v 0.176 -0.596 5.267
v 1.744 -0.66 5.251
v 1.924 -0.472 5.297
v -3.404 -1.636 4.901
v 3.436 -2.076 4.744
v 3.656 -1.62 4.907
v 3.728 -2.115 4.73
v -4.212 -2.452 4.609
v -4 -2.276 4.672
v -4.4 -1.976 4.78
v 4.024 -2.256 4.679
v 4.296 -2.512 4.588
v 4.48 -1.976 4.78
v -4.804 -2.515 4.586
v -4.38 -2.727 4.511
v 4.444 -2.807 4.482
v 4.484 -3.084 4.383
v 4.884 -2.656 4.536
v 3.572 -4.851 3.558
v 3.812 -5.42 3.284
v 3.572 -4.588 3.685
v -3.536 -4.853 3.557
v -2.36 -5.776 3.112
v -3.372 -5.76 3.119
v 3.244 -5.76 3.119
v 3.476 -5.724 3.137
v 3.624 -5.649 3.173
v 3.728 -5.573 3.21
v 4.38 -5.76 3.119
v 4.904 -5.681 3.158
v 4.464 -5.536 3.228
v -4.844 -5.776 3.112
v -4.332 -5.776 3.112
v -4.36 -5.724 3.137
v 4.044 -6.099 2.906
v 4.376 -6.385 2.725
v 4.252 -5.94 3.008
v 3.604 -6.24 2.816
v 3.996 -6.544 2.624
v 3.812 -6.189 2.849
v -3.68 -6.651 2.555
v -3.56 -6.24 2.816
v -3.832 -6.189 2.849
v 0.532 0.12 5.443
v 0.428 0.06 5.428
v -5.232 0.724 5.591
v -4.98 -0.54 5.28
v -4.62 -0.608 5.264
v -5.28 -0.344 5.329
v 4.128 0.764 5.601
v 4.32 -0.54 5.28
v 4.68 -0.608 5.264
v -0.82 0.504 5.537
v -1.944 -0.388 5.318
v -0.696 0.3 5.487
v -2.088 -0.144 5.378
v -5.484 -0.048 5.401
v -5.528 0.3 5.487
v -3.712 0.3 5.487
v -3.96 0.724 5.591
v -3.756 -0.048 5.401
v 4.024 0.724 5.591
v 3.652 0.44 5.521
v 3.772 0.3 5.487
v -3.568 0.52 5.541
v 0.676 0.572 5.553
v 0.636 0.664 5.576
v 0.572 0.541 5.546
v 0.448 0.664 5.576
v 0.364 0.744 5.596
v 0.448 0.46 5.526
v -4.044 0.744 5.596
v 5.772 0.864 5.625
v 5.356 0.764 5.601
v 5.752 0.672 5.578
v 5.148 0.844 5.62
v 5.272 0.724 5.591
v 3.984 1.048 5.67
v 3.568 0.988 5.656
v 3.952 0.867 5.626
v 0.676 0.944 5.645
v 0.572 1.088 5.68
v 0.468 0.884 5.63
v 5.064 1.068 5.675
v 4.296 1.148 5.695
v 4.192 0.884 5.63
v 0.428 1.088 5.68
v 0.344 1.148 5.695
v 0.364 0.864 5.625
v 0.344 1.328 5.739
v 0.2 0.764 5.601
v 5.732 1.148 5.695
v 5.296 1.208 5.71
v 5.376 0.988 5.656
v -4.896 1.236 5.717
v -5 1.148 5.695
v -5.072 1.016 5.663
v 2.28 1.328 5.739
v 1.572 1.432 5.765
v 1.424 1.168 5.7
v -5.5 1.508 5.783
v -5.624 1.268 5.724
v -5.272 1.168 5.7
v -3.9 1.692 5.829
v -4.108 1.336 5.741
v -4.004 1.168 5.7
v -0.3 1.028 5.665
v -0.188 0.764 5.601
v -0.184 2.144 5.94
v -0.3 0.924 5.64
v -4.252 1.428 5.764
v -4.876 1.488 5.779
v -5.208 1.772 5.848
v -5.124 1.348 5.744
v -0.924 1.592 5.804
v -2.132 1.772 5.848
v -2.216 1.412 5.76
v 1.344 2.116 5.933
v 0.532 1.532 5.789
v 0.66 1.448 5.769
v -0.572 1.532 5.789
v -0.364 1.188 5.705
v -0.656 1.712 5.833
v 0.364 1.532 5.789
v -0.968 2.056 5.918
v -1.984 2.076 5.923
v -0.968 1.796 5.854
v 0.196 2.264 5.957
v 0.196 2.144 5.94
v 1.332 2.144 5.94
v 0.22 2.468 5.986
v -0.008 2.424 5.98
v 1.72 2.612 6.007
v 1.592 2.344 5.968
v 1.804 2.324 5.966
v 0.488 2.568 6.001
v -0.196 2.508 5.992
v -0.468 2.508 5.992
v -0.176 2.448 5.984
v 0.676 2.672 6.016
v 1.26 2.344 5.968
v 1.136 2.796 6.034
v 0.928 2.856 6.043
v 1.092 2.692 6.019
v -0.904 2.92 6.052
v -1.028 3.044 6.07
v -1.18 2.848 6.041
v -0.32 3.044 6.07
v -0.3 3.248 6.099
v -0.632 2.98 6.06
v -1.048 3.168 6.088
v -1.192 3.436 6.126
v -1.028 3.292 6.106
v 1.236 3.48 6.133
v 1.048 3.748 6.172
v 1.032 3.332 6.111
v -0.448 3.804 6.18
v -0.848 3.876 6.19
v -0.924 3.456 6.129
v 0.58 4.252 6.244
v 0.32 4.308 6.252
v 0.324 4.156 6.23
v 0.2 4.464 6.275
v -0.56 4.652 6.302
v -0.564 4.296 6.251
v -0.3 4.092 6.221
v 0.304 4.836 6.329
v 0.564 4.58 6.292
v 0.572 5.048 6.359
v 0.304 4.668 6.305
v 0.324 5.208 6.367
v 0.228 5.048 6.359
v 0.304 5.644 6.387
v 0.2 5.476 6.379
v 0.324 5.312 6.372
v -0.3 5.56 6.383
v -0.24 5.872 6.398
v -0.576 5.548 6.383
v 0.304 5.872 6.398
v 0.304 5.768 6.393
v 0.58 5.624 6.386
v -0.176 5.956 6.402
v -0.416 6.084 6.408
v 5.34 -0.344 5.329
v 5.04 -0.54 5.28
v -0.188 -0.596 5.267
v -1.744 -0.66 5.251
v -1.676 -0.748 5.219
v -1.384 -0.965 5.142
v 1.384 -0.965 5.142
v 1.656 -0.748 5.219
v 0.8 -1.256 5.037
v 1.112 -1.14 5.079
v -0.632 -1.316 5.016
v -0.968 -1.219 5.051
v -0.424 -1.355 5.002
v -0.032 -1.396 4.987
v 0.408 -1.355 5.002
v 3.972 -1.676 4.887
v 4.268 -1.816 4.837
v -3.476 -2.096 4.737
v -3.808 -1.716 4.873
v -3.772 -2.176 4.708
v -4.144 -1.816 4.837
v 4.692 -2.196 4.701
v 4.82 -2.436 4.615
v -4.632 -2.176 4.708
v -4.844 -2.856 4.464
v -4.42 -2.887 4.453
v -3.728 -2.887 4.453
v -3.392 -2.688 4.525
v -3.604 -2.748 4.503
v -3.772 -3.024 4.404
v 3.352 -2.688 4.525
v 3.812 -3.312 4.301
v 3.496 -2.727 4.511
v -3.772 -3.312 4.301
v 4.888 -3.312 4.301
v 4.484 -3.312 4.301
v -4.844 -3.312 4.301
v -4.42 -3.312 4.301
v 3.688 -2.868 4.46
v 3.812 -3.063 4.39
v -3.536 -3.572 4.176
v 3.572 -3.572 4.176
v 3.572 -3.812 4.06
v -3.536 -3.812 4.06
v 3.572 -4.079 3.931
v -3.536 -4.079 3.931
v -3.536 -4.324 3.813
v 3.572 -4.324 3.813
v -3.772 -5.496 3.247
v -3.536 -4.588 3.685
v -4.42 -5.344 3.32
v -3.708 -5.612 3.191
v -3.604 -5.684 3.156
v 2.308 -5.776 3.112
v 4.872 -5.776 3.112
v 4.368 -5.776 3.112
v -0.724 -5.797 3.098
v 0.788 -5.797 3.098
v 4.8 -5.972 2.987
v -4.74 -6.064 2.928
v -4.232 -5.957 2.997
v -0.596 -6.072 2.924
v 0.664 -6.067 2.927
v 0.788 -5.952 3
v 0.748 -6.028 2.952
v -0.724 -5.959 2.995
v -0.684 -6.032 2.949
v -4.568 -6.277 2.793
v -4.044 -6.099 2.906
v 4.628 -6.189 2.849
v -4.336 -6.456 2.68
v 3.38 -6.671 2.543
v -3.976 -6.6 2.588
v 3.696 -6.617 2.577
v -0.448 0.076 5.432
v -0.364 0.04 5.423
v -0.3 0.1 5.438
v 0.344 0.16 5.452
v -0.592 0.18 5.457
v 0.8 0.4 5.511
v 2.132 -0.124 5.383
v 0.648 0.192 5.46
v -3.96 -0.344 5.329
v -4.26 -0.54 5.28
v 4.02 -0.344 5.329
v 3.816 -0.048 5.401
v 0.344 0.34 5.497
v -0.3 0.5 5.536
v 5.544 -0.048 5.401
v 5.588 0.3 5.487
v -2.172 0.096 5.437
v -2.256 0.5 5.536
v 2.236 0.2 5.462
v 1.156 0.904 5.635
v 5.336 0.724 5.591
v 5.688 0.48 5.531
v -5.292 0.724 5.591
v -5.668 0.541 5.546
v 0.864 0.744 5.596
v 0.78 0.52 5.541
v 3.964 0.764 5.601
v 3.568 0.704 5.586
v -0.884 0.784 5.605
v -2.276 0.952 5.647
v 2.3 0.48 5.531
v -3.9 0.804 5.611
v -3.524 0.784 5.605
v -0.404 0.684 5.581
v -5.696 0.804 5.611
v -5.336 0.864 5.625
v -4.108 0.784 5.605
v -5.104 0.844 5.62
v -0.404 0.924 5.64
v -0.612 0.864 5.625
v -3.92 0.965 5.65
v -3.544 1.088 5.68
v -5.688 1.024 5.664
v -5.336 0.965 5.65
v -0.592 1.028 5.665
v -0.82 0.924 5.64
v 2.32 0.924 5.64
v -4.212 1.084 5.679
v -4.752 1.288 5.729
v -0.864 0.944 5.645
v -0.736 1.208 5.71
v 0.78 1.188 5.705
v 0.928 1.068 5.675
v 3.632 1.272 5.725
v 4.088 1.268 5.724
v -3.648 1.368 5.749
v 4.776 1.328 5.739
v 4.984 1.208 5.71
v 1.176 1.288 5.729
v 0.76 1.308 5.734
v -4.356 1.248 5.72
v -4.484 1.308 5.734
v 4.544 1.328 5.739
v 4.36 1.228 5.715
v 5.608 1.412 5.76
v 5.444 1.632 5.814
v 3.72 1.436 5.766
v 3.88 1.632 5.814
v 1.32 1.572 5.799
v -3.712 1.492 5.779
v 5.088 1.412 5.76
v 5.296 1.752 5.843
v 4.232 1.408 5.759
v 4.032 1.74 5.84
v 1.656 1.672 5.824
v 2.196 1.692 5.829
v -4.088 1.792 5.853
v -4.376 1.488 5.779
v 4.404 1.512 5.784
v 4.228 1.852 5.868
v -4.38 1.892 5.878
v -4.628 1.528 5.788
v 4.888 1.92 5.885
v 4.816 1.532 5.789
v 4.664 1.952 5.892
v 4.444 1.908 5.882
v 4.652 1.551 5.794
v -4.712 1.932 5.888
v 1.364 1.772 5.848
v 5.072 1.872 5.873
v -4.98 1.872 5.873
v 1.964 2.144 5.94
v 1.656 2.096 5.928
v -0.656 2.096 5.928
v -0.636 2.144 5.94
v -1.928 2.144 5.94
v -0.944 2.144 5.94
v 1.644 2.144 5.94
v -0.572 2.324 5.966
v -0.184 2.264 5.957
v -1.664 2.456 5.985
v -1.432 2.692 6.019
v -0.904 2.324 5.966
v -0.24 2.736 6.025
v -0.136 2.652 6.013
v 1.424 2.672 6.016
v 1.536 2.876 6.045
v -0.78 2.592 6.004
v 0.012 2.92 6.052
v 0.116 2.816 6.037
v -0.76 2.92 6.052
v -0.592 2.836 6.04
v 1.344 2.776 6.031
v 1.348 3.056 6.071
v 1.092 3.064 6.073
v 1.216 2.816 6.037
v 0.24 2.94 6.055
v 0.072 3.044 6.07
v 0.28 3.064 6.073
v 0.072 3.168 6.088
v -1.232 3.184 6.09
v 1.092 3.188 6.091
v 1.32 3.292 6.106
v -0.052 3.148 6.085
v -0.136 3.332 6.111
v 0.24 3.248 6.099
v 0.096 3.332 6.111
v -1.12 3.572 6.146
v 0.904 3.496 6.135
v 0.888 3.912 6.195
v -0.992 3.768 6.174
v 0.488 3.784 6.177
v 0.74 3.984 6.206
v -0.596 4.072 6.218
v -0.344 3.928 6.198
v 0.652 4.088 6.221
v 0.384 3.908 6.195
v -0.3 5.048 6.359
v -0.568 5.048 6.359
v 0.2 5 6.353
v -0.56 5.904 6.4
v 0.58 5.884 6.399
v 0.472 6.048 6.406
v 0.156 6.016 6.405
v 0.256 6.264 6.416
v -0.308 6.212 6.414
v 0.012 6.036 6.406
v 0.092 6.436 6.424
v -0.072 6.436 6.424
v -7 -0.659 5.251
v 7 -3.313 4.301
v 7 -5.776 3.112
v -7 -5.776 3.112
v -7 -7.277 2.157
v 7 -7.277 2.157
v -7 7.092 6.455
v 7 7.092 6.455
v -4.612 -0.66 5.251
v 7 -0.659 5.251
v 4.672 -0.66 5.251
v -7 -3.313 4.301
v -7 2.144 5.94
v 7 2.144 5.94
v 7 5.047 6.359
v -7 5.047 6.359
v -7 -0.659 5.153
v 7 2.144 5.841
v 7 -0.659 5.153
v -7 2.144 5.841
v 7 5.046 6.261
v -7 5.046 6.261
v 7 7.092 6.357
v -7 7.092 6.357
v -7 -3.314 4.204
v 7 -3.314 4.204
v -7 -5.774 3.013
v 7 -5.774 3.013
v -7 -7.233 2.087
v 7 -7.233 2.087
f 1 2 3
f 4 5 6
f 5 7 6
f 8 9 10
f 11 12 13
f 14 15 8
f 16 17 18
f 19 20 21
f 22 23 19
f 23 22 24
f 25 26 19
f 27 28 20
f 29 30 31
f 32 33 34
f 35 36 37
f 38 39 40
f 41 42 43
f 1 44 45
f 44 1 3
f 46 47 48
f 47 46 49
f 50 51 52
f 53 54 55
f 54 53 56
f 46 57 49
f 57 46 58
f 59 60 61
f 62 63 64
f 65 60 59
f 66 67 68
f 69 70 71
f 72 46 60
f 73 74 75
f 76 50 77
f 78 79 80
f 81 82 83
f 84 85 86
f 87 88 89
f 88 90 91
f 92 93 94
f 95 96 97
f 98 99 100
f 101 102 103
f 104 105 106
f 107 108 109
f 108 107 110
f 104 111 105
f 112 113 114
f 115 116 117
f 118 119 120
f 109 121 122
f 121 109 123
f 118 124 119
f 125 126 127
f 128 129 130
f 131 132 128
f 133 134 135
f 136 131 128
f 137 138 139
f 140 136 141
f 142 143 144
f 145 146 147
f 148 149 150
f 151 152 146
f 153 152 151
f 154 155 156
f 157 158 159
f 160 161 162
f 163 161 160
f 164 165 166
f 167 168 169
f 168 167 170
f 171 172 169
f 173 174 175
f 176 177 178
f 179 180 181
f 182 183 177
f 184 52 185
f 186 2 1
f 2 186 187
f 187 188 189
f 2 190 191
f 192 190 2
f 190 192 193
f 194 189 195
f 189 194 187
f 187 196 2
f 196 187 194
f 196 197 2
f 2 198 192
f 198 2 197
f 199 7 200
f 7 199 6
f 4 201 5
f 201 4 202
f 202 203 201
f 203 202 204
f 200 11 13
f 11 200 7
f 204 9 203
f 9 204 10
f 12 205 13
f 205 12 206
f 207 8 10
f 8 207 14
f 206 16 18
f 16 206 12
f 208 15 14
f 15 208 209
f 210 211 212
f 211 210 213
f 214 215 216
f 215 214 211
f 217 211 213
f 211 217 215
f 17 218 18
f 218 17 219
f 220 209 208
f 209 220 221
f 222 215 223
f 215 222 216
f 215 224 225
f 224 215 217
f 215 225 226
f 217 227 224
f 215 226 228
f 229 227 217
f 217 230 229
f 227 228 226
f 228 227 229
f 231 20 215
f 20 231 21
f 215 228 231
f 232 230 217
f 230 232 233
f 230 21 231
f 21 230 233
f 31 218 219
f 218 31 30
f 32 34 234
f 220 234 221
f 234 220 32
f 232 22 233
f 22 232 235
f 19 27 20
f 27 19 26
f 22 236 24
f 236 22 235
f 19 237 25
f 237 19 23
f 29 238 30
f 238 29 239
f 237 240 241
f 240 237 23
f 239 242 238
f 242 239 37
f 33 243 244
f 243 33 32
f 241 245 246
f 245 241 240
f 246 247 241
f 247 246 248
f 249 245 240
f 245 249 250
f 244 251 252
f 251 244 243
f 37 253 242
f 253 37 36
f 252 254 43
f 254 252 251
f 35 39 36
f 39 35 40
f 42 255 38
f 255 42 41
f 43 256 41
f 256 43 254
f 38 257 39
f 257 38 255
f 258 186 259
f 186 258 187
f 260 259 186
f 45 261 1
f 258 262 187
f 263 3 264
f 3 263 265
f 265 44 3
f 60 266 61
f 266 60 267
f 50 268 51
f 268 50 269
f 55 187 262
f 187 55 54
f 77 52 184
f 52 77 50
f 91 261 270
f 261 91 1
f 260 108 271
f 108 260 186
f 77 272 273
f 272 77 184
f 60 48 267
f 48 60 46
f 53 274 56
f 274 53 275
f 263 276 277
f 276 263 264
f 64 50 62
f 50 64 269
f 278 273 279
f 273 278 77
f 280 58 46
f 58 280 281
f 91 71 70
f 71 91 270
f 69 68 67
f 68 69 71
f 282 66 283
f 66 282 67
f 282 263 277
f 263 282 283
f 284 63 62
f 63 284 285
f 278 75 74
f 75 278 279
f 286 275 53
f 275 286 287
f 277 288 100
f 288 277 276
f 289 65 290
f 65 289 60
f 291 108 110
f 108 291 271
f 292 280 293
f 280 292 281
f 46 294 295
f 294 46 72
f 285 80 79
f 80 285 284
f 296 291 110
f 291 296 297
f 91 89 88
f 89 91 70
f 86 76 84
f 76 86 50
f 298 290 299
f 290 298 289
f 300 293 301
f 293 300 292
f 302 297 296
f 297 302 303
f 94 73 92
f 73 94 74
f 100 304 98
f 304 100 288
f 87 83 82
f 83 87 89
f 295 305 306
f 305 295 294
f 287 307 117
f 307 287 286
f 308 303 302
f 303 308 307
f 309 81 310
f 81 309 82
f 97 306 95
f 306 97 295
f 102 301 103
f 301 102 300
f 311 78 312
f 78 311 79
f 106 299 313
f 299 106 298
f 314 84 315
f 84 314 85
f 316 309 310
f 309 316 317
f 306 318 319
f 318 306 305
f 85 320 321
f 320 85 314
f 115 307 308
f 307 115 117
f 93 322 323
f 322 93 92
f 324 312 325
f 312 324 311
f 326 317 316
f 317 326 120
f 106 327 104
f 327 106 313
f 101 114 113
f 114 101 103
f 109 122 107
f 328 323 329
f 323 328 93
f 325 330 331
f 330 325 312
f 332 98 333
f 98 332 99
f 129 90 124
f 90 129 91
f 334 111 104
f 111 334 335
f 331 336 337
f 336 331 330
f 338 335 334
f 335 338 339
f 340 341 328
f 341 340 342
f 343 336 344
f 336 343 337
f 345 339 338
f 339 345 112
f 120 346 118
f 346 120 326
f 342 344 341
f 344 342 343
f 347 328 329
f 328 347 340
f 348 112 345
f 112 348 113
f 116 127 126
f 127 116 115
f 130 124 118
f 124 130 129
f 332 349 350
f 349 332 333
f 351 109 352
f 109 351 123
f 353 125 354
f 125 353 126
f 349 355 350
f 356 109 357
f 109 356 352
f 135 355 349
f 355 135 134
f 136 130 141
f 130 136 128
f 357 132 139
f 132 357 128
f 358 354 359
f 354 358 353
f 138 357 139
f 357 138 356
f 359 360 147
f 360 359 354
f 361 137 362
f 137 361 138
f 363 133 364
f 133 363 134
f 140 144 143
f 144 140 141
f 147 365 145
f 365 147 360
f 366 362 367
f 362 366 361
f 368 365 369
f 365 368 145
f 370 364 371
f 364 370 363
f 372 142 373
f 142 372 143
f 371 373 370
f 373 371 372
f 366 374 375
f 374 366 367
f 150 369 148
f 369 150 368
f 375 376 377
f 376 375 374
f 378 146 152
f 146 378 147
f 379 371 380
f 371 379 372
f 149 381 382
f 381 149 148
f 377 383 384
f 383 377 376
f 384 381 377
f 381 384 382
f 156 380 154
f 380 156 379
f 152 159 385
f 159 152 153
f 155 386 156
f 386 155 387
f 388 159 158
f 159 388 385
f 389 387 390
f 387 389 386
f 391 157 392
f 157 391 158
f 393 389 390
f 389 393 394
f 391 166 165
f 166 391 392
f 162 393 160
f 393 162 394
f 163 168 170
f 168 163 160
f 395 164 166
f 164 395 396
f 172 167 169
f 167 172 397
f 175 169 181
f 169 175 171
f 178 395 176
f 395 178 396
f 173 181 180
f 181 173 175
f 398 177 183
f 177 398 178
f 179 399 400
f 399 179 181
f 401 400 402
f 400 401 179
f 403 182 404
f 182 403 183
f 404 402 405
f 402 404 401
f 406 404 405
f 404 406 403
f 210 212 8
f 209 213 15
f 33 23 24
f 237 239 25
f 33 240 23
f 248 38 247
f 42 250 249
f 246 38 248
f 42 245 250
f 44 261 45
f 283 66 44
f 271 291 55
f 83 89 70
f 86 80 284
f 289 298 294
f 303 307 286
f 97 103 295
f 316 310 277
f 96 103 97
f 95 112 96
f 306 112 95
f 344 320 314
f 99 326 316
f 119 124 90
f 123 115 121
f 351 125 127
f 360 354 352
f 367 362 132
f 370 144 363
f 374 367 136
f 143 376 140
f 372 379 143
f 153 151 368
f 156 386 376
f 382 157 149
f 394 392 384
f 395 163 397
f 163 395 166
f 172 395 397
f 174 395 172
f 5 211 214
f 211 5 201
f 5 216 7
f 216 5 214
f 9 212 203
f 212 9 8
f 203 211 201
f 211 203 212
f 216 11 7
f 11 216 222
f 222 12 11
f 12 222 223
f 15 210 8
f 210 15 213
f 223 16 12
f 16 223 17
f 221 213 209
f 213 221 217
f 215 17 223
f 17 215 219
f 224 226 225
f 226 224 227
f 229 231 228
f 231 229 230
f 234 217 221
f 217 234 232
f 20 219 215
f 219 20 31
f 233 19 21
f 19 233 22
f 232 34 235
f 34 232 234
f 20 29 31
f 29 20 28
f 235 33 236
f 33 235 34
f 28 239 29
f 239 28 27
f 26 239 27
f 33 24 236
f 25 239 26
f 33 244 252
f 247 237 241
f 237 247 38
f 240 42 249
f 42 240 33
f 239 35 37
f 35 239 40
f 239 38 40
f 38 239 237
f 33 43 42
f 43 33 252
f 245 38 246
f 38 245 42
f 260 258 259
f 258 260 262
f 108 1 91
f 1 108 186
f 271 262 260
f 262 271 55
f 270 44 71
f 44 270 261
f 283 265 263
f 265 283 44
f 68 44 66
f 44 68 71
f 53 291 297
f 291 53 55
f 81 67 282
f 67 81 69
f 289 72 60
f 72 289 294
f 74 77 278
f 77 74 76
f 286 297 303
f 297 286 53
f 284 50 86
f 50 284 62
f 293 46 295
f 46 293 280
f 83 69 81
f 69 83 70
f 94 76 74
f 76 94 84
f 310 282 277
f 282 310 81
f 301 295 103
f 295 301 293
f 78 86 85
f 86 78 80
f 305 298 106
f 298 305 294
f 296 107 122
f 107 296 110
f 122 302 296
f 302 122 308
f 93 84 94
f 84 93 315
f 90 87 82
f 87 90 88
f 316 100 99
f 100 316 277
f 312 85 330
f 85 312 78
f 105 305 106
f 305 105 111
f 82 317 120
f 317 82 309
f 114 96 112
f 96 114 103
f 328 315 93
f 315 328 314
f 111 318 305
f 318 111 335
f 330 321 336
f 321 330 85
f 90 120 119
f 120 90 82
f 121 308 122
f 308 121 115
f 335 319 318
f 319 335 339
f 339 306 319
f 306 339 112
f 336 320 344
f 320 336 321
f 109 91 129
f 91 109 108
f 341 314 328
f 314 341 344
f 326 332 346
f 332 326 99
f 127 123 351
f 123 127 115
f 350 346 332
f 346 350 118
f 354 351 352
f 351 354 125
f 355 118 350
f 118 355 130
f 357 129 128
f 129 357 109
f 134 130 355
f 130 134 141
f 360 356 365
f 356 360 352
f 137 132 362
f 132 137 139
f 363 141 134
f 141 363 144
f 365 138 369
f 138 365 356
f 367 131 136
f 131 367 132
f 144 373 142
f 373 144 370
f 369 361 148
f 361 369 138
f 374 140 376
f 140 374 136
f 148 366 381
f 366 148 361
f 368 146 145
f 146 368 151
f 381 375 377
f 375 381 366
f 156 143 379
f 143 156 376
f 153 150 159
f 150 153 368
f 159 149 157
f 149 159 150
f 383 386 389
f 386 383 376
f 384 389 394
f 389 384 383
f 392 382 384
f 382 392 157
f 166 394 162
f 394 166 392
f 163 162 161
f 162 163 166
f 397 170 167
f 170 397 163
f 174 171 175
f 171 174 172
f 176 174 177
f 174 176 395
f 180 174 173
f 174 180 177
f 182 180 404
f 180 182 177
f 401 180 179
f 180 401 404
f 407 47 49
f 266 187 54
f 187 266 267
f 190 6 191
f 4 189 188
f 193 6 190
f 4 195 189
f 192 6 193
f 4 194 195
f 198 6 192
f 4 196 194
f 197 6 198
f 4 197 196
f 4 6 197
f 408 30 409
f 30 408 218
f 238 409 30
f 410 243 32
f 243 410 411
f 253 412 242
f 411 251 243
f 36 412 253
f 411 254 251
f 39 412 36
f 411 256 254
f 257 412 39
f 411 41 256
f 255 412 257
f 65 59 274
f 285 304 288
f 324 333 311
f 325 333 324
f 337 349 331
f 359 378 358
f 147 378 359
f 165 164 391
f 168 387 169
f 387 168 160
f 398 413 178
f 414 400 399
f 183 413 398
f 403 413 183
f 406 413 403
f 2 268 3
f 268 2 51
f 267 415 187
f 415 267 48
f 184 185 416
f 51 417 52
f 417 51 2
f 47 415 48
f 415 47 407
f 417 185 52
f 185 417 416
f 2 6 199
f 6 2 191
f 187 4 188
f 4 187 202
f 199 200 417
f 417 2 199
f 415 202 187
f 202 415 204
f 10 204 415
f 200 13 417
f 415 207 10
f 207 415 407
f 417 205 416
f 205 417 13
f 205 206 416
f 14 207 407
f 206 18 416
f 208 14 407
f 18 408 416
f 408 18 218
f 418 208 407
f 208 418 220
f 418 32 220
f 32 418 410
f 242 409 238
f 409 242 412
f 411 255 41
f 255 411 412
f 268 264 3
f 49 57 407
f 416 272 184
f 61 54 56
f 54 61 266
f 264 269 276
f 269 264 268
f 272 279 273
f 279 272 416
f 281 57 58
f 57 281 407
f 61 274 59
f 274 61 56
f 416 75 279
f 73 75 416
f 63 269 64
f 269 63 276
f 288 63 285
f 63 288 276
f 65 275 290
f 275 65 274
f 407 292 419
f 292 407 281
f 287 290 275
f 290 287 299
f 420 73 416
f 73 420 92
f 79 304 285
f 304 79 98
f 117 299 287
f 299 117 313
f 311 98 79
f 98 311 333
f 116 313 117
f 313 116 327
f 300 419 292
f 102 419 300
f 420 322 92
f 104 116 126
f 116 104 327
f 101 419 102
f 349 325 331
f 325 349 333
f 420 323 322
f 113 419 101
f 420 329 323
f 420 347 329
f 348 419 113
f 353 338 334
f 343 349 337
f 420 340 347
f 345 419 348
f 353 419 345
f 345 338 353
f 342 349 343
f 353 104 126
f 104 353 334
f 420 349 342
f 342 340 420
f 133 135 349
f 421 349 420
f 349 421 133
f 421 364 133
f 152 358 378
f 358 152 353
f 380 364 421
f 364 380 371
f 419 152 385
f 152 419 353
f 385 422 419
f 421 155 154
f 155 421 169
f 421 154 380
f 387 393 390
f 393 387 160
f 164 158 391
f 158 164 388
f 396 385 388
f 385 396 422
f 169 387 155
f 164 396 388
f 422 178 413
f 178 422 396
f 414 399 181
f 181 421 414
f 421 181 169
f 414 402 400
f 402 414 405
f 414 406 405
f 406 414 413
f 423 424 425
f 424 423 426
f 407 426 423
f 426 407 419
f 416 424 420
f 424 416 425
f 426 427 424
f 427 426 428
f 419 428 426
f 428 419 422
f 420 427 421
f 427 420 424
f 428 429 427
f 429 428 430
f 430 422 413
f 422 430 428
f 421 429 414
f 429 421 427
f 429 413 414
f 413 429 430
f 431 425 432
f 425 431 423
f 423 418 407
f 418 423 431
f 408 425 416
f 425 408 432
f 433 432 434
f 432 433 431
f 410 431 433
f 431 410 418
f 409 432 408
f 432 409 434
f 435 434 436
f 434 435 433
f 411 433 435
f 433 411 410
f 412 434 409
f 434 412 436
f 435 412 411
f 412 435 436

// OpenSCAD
use <../lib.scad>
use <s/6296256dc01s01.scad>
function ldraw_lib__6296256dc01() = [
// 0 Sticker  1.9 x  1.8 with Ignition Key, Switches and Ashtray on Bright Light Yellow (Formed)
// 0 Name: 6296256dc01.dat
// 0 Author: Magnus Forsberg [MagFors]
// 0 !LDRAW_ORG Part UPDATE 2024-05
// 0 !LICENSE Licensed under CC BY 4.0 : see CAreadme.txt
// 
// 0 BFC CERTIFY CCW
  [0,"BFC","CERTIFY"],
  [0,"BFC","CCW"],
// 
// 0 !KEYWORDS 500, Bricklink 10271stk01, Brickowl 815806, Cinquecento, FIAT, Nuova
// 0 !KEYWORDS Rebrickable 67343, set 10271
// 
// 0 !HISTORY 2020-12-29 [PTadmin] Official Update 2020-03
// 0 !HISTORY 2021-09-11 [MagFors] Subfiled for blue version
// 0 !HISTORY 2024-06-30 [OrionP] Official Update 2024-05
// 
// 
// 1 226 0 0 0 1 0 0 0 1 0 0 0 1 s\6296256dc01s01.dat
  [1,226,0,0,0,1,0,0,0,1,0,0,0,1, ldraw_lib__s__6296256dc01s01()],
// 0 // backside
// 4 16 -17.5 -12.8827 -1.648 -17.5 -14.6036 5.36 17.5 -14.6036 5.36 17.5 -12.8827 -1.648
  [4,16,-17.5,-12.8827,-1.648,-17.5,-14.6036,5.36,17.5,-14.6036,5.36,17.5,-12.8827,-1.648],
// 4 16 -17.5 -12.8827 -1.648 -17.5 -13.1279 -1.648 -17.5 -14.8489 5.36 -17.5 -14.6036 5.36
  [4,16,-17.5,-12.8827,-1.648,-17.5,-13.1279,-1.648,-17.5,-14.8489,5.36,-17.5,-14.6036,5.36],
// 4 16 17.5 -13.1279 -1.648 17.5 -12.8827 -1.648 17.5 -14.6036 5.36 17.5 -14.8489 5.36
  [4,16,17.5,-13.1279,-1.648,17.5,-12.8827,-1.648,17.5,-14.6036,5.36,17.5,-14.8489,5.36],
// 4 16 17.5 -14.6036 5.36 -17.5 -14.6036 5.36 -17.5 -15.6524 12.616 17.5 -15.6524 12.616
  [4,16,17.5,-14.6036,5.36,-17.5,-14.6036,5.36,-17.5,-15.6524,12.616,17.5,-15.6524,12.616],
// 4 16 -17.5 -14.6036 5.36 -17.5 -14.8489 5.36 -17.5 -15.8985 12.618 -17.5 -15.6524 12.616
  [4,16,-17.5,-14.6036,5.36,-17.5,-14.8489,5.36,-17.5,-15.8985,12.618,-17.5,-15.6524,12.616],
// 4 16 17.5 -14.8489 5.36 17.5 -14.6036 5.36 17.5 -15.6524 12.616 17.5 -15.8985 12.618
  [4,16,17.5,-14.8489,5.36,17.5,-14.6036,5.36,17.5,-15.6524,12.616,17.5,-15.8985,12.618],
// 4 16 -17.5 -15.6524 12.616 -17.5 -15.8932 17.7298 17.5 -15.8932 17.7298 17.5 -15.6524 12.616
  [4,16,-17.5,-15.6524,12.616,-17.5,-15.8932,17.7298,17.5,-15.8932,17.7298,17.5,-15.6524,12.616],
// 4 16 -17.5 -15.6524 12.616 -17.5 -15.8985 12.618 -17.5 -16.1379 17.7301 -17.5 -15.8932 17.7298
  [4,16,-17.5,-15.6524,12.616,-17.5,-15.8985,12.618,-17.5,-16.1379,17.7301,-17.5,-15.8932,17.7298],
// 4 16 17.5 -15.8985 12.618 17.5 -15.6524 12.616 17.5 -15.8932 17.7298 17.5 -16.1379 17.7301
  [4,16,17.5,-15.8985,12.618,17.5,-15.6524,12.616,17.5,-15.8932,17.7298,17.5,-16.1379,17.7301],
// 4 16 -17.5 -16.1379 17.7301 17.5 -16.1379 17.7301 17.5 -15.8932 17.7298 -17.5 -15.8932 17.7298
  [4,16,-17.5,-16.1379,17.7301,17.5,-16.1379,17.7301,17.5,-15.8932,17.7298,-17.5,-15.8932,17.7298],
// 4 16 17.5 -12.8827 -1.648 17.5 -10.5099 -8.284 -17.5 -10.5099 -8.284 -17.5 -12.8827 -1.648
  [4,16,17.5,-12.8827,-1.648,17.5,-10.5099,-8.284,-17.5,-10.5099,-8.284,-17.5,-12.8827,-1.648],
// 4 16 -17.5 -12.8827 -1.648 -17.5 -10.5099 -8.284 -17.5 -10.7525 -8.282 -17.5 -13.1279 -1.648
  [4,16,-17.5,-12.8827,-1.648,-17.5,-10.5099,-8.284,-17.5,-10.7525,-8.282,-17.5,-13.1279,-1.648],
// 4 16 17.5 -13.1279 -1.648 17.5 -10.7525 -8.282 17.5 -10.5099 -8.284 17.5 -12.8827 -1.648
  [4,16,17.5,-13.1279,-1.648,17.5,-10.7525,-8.282,17.5,-10.5099,-8.284,17.5,-12.8827,-1.648],
// 4 16 -17.5 -10.5099 -8.284 17.5 -10.5099 -8.284 17.5 -7.5316 -14.436 -17.5 -7.5316 -14.436
  [4,16,-17.5,-10.5099,-8.284,17.5,-10.5099,-8.284,17.5,-7.5316,-14.436,-17.5,-7.5316,-14.436],
// 4 16 -17.5 -10.7525 -8.282 -17.5 -10.5099 -8.284 -17.5 -7.5316 -14.436 -17.5 -7.7789 -14.44
  [4,16,-17.5,-10.7525,-8.282,-17.5,-10.5099,-8.284,-17.5,-7.5316,-14.436,-17.5,-7.7789,-14.44],
// 4 16 17.5 -10.5099 -8.284 17.5 -10.7525 -8.282 17.5 -7.7789 -14.44 17.5 -7.5316 -14.436
  [4,16,17.5,-10.5099,-8.284,17.5,-10.7525,-8.282,17.5,-7.7789,-14.44,17.5,-7.5316,-14.436],
// 4 16 -17.5 -7.5316 -14.436 17.5 -7.5316 -14.436 17.5 -5.2174 -18.0819 -17.5 -5.2174 -18.0819
  [4,16,-17.5,-7.5316,-14.436,17.5,-7.5316,-14.436,17.5,-5.2174,-18.0819,-17.5,-5.2174,-18.0819],
// 4 16 -17.5 -7.7789 -14.44 -17.5 -7.5316 -14.436 -17.5 -5.2174 -18.0819 -17.5 -5.3931 -18.1936
  [4,16,-17.5,-7.7789,-14.44,-17.5,-7.5316,-14.436,-17.5,-5.2174,-18.0819,-17.5,-5.3931,-18.1936],
// 4 16 17.5 -7.5316 -14.436 17.5 -7.7789 -14.44 17.5 -5.3931 -18.1936 17.5 -5.2174 -18.0819
  [4,16,17.5,-7.5316,-14.436,17.5,-7.7789,-14.44,17.5,-5.3931,-18.1936,17.5,-5.2174,-18.0819],
// 4 16 -17.5 -5.3931 -18.1936 -17.5 -5.2174 -18.0819 17.5 -5.2174 -18.0819 17.5 -5.3931 -18.1936
  [4,16,-17.5,-5.3931,-18.1936,-17.5,-5.2174,-18.0819,17.5,-5.2174,-18.0819,17.5,-5.3931,-18.1936],
// 5 24 17.5 -15.8985 12.618 -17.5 -15.8985 12.618 17.5 -16.1379 17.7301 17.5 -14.8489 5.36
  [5,24,17.5,-15.8985,12.618,-17.5,-15.8985,12.618,17.5,-16.1379,17.7301,17.5,-14.8489,5.36],
// 5 24 17.5 -14.8489 5.36 -17.5 -14.8489 5.36 17.5 -15.8985 12.618 17.5 -13.1279 -1.648
  [5,24,17.5,-14.8489,5.36,-17.5,-14.8489,5.36,17.5,-15.8985,12.618,17.5,-13.1279,-1.648],
// 5 24 17.5 -13.1279 -1.648 -17.5 -13.1279 -1.648 17.5 -14.8489 5.36 17.5 -10.7525 -8.282
  [5,24,17.5,-13.1279,-1.648,-17.5,-13.1279,-1.648,17.5,-14.8489,5.36,17.5,-10.7525,-8.282],
// 5 24 17.5 -10.7525 -8.282 -17.5 -10.7525 -8.282 17.5 -13.1279 -1.648 17.5 -7.7789 -14.44
  [5,24,17.5,-10.7525,-8.282,-17.5,-10.7525,-8.282,17.5,-13.1279,-1.648,17.5,-7.7789,-14.44],
// 5 24 17.5 -7.7789 -14.44 -17.5 -7.7789 -14.44 17.5 -10.7525 -8.282 17.5 -5.3931 -18.1936
  [5,24,17.5,-7.7789,-14.44,-17.5,-7.7789,-14.44,17.5,-10.7525,-8.282,17.5,-5.3931,-18.1936],
// 5 24 17.5 -15.6524 12.616 -17.5 -15.6524 12.616 17.5 -15.8932 17.7298 17.5 -14.6036 5.36
  [5,24,17.5,-15.6524,12.616,-17.5,-15.6524,12.616,17.5,-15.8932,17.7298,17.5,-14.6036,5.36],
// 5 24 17.5 -14.6036 5.36 -17.5 -14.6036 5.36 17.5 -15.6524 12.616 17.5 -12.8827 -1.648
  [5,24,17.5,-14.6036,5.36,-17.5,-14.6036,5.36,17.5,-15.6524,12.616,17.5,-12.8827,-1.648],
// 5 24 17.5 -12.8827 -1.648 -17.5 -12.8827 -1.648 17.5 -14.6036 5.36 17.5 -10.5099 -8.284
  [5,24,17.5,-12.8827,-1.648,-17.5,-12.8827,-1.648,17.5,-14.6036,5.36,17.5,-10.5099,-8.284],
// 5 24 17.5 -10.5099 -8.284 -17.5 -10.5099 -8.284 17.5 -12.8827 -1.648 17.5 -7.5316 -14.436
  [5,24,17.5,-10.5099,-8.284,-17.5,-10.5099,-8.284,17.5,-12.8827,-1.648,17.5,-7.5316,-14.436],
// 5 24 17.5 -7.5316 -14.436 -17.5 -7.5316 -14.436 17.5 -10.5099 -8.284 17.5 -5.2174 -18.0819
  [5,24,17.5,-7.5316,-14.436,-17.5,-7.5316,-14.436,17.5,-10.5099,-8.284,17.5,-5.2174,-18.0819],
];
module ldraw_lib__6296256dc01(step=0, col=false, unit=2/5, alt=false, line=0.2, solid=!$preview)
    makepoly(ldraw_lib__6296256dc01(), step=step, col=col, unit=unit, alt=alt, line=line, solid=solid);
ldraw_lib__6296256dc01(line=0.2);
